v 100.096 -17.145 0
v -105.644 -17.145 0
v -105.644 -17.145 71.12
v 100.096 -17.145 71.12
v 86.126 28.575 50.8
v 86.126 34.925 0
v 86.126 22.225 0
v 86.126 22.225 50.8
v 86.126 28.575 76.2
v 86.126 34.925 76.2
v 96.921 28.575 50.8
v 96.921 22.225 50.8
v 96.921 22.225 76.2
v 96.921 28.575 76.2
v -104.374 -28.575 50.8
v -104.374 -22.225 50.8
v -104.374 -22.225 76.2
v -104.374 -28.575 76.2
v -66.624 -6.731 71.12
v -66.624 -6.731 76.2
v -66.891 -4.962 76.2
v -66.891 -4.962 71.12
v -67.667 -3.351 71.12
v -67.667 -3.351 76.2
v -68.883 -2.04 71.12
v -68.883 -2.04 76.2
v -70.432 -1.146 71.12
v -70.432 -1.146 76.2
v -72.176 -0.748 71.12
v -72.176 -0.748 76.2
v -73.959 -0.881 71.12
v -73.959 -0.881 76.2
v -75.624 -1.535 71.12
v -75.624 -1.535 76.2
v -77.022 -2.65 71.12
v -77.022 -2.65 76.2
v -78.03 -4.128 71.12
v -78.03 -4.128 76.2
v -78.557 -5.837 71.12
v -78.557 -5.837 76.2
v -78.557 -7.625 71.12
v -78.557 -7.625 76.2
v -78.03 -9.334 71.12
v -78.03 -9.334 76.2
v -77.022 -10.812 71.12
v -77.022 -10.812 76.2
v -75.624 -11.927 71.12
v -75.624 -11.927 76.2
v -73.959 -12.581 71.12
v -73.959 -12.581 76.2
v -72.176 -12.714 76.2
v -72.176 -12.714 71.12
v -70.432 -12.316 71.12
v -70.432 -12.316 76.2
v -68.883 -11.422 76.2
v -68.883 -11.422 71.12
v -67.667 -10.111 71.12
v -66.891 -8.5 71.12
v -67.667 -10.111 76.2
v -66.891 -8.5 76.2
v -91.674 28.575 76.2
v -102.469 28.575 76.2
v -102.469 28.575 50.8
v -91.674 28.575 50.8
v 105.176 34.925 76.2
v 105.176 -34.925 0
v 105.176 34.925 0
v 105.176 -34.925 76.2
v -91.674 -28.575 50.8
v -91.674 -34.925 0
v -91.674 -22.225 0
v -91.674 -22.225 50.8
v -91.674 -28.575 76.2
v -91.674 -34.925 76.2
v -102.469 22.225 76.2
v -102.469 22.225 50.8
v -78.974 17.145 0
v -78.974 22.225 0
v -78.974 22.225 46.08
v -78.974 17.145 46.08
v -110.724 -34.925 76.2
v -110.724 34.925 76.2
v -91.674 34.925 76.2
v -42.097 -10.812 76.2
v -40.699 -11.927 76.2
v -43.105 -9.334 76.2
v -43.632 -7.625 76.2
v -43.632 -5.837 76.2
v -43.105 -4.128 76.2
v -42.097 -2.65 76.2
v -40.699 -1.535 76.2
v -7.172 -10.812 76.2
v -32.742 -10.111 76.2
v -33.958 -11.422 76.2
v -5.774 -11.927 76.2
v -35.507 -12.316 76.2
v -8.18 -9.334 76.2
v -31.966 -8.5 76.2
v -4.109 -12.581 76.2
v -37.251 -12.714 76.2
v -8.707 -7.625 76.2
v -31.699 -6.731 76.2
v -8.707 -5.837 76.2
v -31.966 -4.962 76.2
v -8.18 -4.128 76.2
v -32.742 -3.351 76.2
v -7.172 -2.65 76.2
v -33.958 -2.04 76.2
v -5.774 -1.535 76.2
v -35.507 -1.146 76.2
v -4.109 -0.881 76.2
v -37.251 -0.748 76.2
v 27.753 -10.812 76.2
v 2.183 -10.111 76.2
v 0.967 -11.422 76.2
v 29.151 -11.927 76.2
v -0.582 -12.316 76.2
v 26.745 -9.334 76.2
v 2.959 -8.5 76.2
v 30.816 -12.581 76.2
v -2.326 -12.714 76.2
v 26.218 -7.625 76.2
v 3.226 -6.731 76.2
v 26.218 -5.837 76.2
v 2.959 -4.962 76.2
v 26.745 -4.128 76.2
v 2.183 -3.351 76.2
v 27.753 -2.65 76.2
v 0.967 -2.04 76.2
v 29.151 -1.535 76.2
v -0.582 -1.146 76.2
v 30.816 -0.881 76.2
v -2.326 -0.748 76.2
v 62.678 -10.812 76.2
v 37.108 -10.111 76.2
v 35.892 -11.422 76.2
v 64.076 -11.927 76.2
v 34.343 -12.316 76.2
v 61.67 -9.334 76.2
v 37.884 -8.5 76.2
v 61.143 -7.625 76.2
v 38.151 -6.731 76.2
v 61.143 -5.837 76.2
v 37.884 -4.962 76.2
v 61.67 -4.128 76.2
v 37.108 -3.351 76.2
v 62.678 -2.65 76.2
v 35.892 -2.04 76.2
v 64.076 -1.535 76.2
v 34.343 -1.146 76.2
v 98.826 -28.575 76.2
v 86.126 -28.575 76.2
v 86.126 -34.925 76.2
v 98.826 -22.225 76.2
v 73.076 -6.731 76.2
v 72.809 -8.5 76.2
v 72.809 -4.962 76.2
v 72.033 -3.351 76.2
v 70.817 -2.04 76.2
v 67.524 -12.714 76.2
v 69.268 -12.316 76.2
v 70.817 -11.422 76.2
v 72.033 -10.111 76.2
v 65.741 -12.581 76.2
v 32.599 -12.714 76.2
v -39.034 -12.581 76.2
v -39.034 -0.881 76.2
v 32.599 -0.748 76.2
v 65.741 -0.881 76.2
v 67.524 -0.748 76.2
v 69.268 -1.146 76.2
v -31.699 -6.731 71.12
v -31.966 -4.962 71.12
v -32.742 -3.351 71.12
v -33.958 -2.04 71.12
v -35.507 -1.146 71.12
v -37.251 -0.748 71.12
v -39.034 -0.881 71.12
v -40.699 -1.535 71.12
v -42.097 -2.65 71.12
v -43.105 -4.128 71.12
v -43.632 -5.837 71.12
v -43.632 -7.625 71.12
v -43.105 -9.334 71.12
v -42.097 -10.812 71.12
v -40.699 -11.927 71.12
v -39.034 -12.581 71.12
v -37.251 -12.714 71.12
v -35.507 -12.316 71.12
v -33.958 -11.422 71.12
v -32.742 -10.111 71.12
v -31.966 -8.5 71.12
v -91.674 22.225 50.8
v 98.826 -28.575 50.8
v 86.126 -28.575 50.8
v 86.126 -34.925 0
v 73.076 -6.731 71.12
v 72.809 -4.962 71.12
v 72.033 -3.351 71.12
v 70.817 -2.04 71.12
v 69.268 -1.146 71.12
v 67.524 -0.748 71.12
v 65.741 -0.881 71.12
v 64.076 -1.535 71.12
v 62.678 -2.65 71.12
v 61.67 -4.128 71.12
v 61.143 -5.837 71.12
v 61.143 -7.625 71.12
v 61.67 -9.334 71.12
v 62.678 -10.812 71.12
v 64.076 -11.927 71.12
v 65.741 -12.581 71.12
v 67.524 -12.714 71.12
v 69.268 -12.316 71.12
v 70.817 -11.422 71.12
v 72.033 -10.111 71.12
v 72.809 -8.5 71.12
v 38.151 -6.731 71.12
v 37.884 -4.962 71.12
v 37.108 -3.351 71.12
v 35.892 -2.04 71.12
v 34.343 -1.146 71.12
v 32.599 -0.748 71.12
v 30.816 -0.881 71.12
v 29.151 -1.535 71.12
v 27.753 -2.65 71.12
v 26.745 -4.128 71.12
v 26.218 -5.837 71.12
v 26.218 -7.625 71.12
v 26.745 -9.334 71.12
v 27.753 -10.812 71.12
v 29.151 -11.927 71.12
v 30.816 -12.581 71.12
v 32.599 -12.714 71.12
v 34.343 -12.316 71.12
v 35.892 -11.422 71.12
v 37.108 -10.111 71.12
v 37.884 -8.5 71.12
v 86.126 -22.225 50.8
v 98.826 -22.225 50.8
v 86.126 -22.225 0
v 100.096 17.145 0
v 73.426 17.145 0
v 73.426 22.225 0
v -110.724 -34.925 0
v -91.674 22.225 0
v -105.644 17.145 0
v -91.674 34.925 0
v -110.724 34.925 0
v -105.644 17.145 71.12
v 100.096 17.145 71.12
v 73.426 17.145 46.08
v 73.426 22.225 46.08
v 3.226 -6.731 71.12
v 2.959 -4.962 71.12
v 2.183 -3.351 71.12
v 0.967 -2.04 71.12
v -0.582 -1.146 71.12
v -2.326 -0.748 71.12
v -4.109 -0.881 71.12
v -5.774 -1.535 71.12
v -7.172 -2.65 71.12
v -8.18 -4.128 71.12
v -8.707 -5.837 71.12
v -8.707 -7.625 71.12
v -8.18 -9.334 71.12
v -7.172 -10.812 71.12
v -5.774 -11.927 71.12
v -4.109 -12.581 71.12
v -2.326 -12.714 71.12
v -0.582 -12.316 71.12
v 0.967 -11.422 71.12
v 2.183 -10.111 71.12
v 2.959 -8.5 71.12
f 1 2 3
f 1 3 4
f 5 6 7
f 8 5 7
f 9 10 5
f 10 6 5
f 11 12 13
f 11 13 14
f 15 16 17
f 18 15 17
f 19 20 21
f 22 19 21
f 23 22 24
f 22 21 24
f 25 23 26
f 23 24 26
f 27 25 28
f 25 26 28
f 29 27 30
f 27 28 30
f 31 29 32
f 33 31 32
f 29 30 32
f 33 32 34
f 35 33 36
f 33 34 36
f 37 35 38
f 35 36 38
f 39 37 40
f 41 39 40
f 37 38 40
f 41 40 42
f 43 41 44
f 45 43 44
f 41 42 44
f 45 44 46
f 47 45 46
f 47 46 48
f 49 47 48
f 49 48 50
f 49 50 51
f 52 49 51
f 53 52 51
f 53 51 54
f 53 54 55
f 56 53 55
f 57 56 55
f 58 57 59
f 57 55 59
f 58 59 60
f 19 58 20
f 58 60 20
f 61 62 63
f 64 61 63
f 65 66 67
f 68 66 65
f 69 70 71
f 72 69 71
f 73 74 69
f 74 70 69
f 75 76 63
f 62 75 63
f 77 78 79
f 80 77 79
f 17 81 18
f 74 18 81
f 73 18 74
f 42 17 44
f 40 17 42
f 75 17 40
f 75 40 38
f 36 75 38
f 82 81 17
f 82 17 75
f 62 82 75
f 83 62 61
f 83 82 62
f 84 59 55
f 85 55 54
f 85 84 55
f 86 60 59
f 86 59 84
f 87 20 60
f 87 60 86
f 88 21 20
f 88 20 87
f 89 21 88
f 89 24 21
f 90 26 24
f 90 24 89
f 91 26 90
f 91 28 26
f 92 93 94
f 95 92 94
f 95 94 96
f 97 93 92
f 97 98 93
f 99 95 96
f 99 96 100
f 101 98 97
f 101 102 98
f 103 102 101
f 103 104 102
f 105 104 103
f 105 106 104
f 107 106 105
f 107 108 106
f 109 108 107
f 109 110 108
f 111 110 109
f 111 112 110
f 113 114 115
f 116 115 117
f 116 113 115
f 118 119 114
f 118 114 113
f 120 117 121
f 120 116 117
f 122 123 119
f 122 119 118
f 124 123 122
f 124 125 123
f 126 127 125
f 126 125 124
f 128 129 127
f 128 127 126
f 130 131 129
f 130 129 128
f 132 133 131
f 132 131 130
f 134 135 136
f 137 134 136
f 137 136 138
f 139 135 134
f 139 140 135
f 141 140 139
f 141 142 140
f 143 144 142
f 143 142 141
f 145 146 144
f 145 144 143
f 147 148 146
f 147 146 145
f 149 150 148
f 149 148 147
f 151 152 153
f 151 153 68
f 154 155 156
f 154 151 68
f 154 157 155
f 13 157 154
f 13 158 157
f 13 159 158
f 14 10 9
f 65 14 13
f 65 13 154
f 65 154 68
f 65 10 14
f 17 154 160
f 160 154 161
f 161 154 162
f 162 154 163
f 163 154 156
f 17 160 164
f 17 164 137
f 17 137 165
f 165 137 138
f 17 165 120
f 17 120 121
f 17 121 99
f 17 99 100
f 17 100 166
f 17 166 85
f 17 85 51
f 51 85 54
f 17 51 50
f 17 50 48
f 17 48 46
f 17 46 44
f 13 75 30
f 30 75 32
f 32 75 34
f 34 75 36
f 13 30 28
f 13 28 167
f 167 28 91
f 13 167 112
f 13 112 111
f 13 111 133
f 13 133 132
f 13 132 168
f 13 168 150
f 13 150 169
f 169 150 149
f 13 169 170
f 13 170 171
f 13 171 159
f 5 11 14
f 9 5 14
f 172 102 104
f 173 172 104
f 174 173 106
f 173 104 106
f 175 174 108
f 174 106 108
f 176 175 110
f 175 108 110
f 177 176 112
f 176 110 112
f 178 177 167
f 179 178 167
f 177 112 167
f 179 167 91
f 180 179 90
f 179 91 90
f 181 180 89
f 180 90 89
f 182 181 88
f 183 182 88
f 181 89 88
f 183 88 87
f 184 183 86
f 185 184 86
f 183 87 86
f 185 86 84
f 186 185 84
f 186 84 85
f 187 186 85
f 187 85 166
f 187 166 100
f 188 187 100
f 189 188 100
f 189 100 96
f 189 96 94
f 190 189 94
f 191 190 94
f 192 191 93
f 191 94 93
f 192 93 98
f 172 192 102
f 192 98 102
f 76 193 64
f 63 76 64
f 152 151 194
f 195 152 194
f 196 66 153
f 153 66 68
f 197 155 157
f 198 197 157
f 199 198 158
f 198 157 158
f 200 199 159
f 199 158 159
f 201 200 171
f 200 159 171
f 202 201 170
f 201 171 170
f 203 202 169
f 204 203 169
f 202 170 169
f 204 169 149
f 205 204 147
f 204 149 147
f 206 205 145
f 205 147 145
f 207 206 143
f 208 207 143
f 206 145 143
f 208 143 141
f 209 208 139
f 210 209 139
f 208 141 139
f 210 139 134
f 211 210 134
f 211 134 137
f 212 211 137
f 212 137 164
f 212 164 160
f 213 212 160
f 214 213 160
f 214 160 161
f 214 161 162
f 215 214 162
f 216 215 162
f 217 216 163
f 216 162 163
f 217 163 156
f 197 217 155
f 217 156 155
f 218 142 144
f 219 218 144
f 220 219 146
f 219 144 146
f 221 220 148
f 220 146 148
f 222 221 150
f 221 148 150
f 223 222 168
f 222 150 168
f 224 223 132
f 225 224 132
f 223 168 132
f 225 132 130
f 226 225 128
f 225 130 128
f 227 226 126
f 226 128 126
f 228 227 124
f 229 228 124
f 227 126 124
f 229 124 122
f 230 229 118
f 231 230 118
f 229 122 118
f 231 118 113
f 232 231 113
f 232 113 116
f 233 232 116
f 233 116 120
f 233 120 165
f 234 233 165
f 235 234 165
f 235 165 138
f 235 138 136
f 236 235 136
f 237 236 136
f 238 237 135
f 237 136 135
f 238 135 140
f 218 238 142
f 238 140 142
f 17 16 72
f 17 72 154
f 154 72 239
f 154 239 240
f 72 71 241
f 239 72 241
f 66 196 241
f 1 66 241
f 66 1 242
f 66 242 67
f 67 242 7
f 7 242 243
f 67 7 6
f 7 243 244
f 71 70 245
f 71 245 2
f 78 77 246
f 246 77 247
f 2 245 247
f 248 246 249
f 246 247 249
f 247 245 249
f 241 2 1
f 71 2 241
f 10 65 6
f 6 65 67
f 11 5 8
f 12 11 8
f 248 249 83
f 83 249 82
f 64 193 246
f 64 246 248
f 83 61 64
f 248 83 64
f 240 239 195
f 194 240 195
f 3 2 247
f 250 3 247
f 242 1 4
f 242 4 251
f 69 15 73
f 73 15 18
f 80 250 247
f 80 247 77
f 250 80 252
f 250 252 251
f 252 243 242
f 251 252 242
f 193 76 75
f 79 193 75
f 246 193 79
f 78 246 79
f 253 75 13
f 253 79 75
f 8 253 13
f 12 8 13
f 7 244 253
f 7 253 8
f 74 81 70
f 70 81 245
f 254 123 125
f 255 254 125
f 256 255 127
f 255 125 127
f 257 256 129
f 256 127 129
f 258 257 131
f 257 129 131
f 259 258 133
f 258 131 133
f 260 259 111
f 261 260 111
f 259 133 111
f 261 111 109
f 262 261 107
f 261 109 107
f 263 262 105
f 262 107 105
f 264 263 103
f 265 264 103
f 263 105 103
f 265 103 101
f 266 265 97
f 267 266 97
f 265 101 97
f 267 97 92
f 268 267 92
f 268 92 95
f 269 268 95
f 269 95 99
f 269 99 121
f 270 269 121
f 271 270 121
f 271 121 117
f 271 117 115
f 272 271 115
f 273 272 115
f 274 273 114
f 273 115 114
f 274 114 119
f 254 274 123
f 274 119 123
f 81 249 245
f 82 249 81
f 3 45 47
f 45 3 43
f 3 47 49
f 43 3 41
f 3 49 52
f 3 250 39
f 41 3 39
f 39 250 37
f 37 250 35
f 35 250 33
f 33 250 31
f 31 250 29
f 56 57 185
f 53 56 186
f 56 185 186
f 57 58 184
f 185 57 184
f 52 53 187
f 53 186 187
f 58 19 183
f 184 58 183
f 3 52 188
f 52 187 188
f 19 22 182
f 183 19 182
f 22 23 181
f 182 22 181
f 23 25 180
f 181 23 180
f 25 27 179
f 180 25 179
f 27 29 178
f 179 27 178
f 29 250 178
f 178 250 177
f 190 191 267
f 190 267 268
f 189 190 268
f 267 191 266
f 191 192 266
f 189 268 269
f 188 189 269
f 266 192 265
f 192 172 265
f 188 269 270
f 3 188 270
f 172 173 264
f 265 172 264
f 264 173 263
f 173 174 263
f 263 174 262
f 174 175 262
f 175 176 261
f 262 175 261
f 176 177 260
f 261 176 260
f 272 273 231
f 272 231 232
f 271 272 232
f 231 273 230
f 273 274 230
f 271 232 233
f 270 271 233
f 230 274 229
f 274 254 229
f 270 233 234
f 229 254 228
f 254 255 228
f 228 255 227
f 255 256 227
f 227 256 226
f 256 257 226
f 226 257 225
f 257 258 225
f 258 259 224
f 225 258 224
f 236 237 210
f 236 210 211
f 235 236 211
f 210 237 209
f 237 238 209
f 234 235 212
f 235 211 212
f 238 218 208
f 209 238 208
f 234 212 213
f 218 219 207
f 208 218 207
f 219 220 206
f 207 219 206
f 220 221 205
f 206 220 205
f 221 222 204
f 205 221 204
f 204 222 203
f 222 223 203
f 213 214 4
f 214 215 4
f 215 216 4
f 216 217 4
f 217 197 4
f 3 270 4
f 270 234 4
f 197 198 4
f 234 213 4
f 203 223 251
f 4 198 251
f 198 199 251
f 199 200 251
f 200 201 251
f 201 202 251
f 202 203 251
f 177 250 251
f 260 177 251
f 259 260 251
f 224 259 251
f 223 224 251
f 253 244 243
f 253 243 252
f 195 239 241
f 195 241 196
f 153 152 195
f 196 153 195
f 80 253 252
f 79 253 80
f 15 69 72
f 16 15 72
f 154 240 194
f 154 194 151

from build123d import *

# Parameters (mm, degrees)
F0_W      = 215.9
F0_H      = 44.45
F1_DEPTH  = 76.2
F2_T      = -5.08
F3_W      = 6.35
F3_H      = 76.2
F5_DEPTH  = 12.7
F4_W      = 6.35
F4_H      = 76.2
F6_DEPTH  = 12.7
F8_W      = 6.35
F8_H      = 50.8
F9_DEPTH  = 12.7
F10_W     = 6.35
F10_H     = 50.8
F11_DEPTH = 12.7
F12_W     = 6.35
F12_H     = 50.8
F13_DEPTH = 12.7
F14_W     = 6.35
F14_H     = 50.8
F15_DEPTH = 12.7
F16_W     = 152.4
F16_H     = 46.080392
F17_DEPTH = 5.08
F7_R      = 6
F18_DEPTH = 5.08
F20_W     = 1.905
F20_H     = 6.35
F19_W     = 1.905
F19_H     = 6.35
F21_DEPTH = 25.4


with BuildPart() as f1:
    # F0 (on Top) → F1 (new body)
    with BuildSketch(Plane.XY):
        with Locations((-2.774038, 0)):
            Rectangle(F0_W, F0_H)
    extrude(amount=F1_DEPTH)

    # F2
    f2_openings = [f1.faces().sort_by_distance(p)[0] for p in [
        (-2.774038, 0, 0),
    ]]
    offset(amount=F2_T, openings=f2_openings)

    # F3 (on face) → F5 (join)
    with BuildSketch(Plane.XZ.offset(22.225)):
        with Locations((-107.549038, 38.1)):
            Rectangle(F3_W, F3_H)
        with Locations((102.000962, 38.1)):
            Rectangle(F3_W, F3_H)
    extrude(amount=F5_DEPTH)

    # F4 (on face) → F6 (join)
    with BuildSketch(Plane(origin=(0, 22.225, 0), x_dir=(-1, 0, 0), z_dir=(0, 1, 0))):
        with Locations((-102.000962, 38.1)):
            Rectangle(F4_W, F4_H)
        with Locations((107.549038, 38.1)):
            Rectangle(F4_W, F4_H)
    extrude(amount=F6_DEPTH)

    # F8 (on face) → F9 (join)
    with BuildSketch(Plane.YZ.offset(-104.374038)):
        Polygon((-28.575, 76.2), (-34.925, 76.2), (-34.925, 0), (-28.575, 0), (-28.575, 50.8), align=None)
        with Locations((-25.4, 25.4)):
            Rectangle(F8_W, F8_H)
    extrude(amount=F9_DEPTH)

    # F10 (on face) → F11 (join)
    with BuildSketch(Plane(origin=(98.825962, 0, 0), x_dir=(0, -1, 0), z_dir=(-1, 0, 0))):
        Polygon((34.925, 0), (34.925, 76.2), (28.575, 76.2), (28.575, 50.8), (28.575, 0), align=None)
        with Locations((25.4, 25.4)):
            Rectangle(F10_W, F10_H)
    extrude(amount=F11_DEPTH)

    # F12 (on face) → F13 (join)
    with BuildSketch(Plane(origin=(98.825962, 0, 0), x_dir=(0, -1, 0), z_dir=(-1, 0, 0))):
        Polygon((-34.925, 76.2), (-34.925, 0), (-28.575, 0), (-28.575, 50.8), (-28.575, 76.2), align=None)
        with Locations((-25.4, 25.4)):
            Rectangle(F12_W, F12_H)
    extrude(amount=F13_DEPTH)

    # F14 (on face) → F15 (join)
    with BuildSketch(Plane.YZ.offset(-104.374038)):
        Polygon((34.925, 0), (34.925, 76.2), (28.575, 76.2), (28.575, 50.8), (28.575, 0), align=None)
        with Locations((25.4, 25.4)):
            Rectangle(F14_W, F14_H)
    extrude(amount=F15_DEPTH)

    # F16 (on face) → F17 (cut)
    with BuildSketch(Plane(origin=(0, 22.225, 0), x_dir=(-1, 0, 0), z_dir=(0, 1, 0))):
        with Locations((2.774038, 23.040196)):
            Rectangle(F16_W, F16_H)
    extrude(amount=-F17_DEPTH, mode=Mode.SUBTRACT)

    # F7 (on face) → F18 (cut)
    with BuildSketch(Plane.XY.offset(76.2)):
        with Locations((67.075962, -6.731)):
            Circle(F7_R)
        with Locations((32.150962, -6.731)):
            Circle(F7_R)
        with Locations((-2.774038, -6.731)):
            Circle(F7_R)
        with Locations((-37.699038, -6.731)):
            Circle(F7_R)
        with Locations((-72.624038, -6.731)):
            Circle(F7_R)
    extrude(amount=-F18_DEPTH, mode=Mode.SUBTRACT)

    # F20 (on face) + F19 (on face) → F21 (join)
    with BuildSketch(Plane.XY.offset(50.8)):
        with Locations((-103.421538, 25.4)):
            Rectangle(F20_W, F20_H)
    with BuildSketch(Plane.XY.offset(50.8)):
        with Locations((97.873462, 25.4)):
            Rectangle(F19_W, F19_H)
    extrude(amount=F21_DEPTH)


solid = f1.part
